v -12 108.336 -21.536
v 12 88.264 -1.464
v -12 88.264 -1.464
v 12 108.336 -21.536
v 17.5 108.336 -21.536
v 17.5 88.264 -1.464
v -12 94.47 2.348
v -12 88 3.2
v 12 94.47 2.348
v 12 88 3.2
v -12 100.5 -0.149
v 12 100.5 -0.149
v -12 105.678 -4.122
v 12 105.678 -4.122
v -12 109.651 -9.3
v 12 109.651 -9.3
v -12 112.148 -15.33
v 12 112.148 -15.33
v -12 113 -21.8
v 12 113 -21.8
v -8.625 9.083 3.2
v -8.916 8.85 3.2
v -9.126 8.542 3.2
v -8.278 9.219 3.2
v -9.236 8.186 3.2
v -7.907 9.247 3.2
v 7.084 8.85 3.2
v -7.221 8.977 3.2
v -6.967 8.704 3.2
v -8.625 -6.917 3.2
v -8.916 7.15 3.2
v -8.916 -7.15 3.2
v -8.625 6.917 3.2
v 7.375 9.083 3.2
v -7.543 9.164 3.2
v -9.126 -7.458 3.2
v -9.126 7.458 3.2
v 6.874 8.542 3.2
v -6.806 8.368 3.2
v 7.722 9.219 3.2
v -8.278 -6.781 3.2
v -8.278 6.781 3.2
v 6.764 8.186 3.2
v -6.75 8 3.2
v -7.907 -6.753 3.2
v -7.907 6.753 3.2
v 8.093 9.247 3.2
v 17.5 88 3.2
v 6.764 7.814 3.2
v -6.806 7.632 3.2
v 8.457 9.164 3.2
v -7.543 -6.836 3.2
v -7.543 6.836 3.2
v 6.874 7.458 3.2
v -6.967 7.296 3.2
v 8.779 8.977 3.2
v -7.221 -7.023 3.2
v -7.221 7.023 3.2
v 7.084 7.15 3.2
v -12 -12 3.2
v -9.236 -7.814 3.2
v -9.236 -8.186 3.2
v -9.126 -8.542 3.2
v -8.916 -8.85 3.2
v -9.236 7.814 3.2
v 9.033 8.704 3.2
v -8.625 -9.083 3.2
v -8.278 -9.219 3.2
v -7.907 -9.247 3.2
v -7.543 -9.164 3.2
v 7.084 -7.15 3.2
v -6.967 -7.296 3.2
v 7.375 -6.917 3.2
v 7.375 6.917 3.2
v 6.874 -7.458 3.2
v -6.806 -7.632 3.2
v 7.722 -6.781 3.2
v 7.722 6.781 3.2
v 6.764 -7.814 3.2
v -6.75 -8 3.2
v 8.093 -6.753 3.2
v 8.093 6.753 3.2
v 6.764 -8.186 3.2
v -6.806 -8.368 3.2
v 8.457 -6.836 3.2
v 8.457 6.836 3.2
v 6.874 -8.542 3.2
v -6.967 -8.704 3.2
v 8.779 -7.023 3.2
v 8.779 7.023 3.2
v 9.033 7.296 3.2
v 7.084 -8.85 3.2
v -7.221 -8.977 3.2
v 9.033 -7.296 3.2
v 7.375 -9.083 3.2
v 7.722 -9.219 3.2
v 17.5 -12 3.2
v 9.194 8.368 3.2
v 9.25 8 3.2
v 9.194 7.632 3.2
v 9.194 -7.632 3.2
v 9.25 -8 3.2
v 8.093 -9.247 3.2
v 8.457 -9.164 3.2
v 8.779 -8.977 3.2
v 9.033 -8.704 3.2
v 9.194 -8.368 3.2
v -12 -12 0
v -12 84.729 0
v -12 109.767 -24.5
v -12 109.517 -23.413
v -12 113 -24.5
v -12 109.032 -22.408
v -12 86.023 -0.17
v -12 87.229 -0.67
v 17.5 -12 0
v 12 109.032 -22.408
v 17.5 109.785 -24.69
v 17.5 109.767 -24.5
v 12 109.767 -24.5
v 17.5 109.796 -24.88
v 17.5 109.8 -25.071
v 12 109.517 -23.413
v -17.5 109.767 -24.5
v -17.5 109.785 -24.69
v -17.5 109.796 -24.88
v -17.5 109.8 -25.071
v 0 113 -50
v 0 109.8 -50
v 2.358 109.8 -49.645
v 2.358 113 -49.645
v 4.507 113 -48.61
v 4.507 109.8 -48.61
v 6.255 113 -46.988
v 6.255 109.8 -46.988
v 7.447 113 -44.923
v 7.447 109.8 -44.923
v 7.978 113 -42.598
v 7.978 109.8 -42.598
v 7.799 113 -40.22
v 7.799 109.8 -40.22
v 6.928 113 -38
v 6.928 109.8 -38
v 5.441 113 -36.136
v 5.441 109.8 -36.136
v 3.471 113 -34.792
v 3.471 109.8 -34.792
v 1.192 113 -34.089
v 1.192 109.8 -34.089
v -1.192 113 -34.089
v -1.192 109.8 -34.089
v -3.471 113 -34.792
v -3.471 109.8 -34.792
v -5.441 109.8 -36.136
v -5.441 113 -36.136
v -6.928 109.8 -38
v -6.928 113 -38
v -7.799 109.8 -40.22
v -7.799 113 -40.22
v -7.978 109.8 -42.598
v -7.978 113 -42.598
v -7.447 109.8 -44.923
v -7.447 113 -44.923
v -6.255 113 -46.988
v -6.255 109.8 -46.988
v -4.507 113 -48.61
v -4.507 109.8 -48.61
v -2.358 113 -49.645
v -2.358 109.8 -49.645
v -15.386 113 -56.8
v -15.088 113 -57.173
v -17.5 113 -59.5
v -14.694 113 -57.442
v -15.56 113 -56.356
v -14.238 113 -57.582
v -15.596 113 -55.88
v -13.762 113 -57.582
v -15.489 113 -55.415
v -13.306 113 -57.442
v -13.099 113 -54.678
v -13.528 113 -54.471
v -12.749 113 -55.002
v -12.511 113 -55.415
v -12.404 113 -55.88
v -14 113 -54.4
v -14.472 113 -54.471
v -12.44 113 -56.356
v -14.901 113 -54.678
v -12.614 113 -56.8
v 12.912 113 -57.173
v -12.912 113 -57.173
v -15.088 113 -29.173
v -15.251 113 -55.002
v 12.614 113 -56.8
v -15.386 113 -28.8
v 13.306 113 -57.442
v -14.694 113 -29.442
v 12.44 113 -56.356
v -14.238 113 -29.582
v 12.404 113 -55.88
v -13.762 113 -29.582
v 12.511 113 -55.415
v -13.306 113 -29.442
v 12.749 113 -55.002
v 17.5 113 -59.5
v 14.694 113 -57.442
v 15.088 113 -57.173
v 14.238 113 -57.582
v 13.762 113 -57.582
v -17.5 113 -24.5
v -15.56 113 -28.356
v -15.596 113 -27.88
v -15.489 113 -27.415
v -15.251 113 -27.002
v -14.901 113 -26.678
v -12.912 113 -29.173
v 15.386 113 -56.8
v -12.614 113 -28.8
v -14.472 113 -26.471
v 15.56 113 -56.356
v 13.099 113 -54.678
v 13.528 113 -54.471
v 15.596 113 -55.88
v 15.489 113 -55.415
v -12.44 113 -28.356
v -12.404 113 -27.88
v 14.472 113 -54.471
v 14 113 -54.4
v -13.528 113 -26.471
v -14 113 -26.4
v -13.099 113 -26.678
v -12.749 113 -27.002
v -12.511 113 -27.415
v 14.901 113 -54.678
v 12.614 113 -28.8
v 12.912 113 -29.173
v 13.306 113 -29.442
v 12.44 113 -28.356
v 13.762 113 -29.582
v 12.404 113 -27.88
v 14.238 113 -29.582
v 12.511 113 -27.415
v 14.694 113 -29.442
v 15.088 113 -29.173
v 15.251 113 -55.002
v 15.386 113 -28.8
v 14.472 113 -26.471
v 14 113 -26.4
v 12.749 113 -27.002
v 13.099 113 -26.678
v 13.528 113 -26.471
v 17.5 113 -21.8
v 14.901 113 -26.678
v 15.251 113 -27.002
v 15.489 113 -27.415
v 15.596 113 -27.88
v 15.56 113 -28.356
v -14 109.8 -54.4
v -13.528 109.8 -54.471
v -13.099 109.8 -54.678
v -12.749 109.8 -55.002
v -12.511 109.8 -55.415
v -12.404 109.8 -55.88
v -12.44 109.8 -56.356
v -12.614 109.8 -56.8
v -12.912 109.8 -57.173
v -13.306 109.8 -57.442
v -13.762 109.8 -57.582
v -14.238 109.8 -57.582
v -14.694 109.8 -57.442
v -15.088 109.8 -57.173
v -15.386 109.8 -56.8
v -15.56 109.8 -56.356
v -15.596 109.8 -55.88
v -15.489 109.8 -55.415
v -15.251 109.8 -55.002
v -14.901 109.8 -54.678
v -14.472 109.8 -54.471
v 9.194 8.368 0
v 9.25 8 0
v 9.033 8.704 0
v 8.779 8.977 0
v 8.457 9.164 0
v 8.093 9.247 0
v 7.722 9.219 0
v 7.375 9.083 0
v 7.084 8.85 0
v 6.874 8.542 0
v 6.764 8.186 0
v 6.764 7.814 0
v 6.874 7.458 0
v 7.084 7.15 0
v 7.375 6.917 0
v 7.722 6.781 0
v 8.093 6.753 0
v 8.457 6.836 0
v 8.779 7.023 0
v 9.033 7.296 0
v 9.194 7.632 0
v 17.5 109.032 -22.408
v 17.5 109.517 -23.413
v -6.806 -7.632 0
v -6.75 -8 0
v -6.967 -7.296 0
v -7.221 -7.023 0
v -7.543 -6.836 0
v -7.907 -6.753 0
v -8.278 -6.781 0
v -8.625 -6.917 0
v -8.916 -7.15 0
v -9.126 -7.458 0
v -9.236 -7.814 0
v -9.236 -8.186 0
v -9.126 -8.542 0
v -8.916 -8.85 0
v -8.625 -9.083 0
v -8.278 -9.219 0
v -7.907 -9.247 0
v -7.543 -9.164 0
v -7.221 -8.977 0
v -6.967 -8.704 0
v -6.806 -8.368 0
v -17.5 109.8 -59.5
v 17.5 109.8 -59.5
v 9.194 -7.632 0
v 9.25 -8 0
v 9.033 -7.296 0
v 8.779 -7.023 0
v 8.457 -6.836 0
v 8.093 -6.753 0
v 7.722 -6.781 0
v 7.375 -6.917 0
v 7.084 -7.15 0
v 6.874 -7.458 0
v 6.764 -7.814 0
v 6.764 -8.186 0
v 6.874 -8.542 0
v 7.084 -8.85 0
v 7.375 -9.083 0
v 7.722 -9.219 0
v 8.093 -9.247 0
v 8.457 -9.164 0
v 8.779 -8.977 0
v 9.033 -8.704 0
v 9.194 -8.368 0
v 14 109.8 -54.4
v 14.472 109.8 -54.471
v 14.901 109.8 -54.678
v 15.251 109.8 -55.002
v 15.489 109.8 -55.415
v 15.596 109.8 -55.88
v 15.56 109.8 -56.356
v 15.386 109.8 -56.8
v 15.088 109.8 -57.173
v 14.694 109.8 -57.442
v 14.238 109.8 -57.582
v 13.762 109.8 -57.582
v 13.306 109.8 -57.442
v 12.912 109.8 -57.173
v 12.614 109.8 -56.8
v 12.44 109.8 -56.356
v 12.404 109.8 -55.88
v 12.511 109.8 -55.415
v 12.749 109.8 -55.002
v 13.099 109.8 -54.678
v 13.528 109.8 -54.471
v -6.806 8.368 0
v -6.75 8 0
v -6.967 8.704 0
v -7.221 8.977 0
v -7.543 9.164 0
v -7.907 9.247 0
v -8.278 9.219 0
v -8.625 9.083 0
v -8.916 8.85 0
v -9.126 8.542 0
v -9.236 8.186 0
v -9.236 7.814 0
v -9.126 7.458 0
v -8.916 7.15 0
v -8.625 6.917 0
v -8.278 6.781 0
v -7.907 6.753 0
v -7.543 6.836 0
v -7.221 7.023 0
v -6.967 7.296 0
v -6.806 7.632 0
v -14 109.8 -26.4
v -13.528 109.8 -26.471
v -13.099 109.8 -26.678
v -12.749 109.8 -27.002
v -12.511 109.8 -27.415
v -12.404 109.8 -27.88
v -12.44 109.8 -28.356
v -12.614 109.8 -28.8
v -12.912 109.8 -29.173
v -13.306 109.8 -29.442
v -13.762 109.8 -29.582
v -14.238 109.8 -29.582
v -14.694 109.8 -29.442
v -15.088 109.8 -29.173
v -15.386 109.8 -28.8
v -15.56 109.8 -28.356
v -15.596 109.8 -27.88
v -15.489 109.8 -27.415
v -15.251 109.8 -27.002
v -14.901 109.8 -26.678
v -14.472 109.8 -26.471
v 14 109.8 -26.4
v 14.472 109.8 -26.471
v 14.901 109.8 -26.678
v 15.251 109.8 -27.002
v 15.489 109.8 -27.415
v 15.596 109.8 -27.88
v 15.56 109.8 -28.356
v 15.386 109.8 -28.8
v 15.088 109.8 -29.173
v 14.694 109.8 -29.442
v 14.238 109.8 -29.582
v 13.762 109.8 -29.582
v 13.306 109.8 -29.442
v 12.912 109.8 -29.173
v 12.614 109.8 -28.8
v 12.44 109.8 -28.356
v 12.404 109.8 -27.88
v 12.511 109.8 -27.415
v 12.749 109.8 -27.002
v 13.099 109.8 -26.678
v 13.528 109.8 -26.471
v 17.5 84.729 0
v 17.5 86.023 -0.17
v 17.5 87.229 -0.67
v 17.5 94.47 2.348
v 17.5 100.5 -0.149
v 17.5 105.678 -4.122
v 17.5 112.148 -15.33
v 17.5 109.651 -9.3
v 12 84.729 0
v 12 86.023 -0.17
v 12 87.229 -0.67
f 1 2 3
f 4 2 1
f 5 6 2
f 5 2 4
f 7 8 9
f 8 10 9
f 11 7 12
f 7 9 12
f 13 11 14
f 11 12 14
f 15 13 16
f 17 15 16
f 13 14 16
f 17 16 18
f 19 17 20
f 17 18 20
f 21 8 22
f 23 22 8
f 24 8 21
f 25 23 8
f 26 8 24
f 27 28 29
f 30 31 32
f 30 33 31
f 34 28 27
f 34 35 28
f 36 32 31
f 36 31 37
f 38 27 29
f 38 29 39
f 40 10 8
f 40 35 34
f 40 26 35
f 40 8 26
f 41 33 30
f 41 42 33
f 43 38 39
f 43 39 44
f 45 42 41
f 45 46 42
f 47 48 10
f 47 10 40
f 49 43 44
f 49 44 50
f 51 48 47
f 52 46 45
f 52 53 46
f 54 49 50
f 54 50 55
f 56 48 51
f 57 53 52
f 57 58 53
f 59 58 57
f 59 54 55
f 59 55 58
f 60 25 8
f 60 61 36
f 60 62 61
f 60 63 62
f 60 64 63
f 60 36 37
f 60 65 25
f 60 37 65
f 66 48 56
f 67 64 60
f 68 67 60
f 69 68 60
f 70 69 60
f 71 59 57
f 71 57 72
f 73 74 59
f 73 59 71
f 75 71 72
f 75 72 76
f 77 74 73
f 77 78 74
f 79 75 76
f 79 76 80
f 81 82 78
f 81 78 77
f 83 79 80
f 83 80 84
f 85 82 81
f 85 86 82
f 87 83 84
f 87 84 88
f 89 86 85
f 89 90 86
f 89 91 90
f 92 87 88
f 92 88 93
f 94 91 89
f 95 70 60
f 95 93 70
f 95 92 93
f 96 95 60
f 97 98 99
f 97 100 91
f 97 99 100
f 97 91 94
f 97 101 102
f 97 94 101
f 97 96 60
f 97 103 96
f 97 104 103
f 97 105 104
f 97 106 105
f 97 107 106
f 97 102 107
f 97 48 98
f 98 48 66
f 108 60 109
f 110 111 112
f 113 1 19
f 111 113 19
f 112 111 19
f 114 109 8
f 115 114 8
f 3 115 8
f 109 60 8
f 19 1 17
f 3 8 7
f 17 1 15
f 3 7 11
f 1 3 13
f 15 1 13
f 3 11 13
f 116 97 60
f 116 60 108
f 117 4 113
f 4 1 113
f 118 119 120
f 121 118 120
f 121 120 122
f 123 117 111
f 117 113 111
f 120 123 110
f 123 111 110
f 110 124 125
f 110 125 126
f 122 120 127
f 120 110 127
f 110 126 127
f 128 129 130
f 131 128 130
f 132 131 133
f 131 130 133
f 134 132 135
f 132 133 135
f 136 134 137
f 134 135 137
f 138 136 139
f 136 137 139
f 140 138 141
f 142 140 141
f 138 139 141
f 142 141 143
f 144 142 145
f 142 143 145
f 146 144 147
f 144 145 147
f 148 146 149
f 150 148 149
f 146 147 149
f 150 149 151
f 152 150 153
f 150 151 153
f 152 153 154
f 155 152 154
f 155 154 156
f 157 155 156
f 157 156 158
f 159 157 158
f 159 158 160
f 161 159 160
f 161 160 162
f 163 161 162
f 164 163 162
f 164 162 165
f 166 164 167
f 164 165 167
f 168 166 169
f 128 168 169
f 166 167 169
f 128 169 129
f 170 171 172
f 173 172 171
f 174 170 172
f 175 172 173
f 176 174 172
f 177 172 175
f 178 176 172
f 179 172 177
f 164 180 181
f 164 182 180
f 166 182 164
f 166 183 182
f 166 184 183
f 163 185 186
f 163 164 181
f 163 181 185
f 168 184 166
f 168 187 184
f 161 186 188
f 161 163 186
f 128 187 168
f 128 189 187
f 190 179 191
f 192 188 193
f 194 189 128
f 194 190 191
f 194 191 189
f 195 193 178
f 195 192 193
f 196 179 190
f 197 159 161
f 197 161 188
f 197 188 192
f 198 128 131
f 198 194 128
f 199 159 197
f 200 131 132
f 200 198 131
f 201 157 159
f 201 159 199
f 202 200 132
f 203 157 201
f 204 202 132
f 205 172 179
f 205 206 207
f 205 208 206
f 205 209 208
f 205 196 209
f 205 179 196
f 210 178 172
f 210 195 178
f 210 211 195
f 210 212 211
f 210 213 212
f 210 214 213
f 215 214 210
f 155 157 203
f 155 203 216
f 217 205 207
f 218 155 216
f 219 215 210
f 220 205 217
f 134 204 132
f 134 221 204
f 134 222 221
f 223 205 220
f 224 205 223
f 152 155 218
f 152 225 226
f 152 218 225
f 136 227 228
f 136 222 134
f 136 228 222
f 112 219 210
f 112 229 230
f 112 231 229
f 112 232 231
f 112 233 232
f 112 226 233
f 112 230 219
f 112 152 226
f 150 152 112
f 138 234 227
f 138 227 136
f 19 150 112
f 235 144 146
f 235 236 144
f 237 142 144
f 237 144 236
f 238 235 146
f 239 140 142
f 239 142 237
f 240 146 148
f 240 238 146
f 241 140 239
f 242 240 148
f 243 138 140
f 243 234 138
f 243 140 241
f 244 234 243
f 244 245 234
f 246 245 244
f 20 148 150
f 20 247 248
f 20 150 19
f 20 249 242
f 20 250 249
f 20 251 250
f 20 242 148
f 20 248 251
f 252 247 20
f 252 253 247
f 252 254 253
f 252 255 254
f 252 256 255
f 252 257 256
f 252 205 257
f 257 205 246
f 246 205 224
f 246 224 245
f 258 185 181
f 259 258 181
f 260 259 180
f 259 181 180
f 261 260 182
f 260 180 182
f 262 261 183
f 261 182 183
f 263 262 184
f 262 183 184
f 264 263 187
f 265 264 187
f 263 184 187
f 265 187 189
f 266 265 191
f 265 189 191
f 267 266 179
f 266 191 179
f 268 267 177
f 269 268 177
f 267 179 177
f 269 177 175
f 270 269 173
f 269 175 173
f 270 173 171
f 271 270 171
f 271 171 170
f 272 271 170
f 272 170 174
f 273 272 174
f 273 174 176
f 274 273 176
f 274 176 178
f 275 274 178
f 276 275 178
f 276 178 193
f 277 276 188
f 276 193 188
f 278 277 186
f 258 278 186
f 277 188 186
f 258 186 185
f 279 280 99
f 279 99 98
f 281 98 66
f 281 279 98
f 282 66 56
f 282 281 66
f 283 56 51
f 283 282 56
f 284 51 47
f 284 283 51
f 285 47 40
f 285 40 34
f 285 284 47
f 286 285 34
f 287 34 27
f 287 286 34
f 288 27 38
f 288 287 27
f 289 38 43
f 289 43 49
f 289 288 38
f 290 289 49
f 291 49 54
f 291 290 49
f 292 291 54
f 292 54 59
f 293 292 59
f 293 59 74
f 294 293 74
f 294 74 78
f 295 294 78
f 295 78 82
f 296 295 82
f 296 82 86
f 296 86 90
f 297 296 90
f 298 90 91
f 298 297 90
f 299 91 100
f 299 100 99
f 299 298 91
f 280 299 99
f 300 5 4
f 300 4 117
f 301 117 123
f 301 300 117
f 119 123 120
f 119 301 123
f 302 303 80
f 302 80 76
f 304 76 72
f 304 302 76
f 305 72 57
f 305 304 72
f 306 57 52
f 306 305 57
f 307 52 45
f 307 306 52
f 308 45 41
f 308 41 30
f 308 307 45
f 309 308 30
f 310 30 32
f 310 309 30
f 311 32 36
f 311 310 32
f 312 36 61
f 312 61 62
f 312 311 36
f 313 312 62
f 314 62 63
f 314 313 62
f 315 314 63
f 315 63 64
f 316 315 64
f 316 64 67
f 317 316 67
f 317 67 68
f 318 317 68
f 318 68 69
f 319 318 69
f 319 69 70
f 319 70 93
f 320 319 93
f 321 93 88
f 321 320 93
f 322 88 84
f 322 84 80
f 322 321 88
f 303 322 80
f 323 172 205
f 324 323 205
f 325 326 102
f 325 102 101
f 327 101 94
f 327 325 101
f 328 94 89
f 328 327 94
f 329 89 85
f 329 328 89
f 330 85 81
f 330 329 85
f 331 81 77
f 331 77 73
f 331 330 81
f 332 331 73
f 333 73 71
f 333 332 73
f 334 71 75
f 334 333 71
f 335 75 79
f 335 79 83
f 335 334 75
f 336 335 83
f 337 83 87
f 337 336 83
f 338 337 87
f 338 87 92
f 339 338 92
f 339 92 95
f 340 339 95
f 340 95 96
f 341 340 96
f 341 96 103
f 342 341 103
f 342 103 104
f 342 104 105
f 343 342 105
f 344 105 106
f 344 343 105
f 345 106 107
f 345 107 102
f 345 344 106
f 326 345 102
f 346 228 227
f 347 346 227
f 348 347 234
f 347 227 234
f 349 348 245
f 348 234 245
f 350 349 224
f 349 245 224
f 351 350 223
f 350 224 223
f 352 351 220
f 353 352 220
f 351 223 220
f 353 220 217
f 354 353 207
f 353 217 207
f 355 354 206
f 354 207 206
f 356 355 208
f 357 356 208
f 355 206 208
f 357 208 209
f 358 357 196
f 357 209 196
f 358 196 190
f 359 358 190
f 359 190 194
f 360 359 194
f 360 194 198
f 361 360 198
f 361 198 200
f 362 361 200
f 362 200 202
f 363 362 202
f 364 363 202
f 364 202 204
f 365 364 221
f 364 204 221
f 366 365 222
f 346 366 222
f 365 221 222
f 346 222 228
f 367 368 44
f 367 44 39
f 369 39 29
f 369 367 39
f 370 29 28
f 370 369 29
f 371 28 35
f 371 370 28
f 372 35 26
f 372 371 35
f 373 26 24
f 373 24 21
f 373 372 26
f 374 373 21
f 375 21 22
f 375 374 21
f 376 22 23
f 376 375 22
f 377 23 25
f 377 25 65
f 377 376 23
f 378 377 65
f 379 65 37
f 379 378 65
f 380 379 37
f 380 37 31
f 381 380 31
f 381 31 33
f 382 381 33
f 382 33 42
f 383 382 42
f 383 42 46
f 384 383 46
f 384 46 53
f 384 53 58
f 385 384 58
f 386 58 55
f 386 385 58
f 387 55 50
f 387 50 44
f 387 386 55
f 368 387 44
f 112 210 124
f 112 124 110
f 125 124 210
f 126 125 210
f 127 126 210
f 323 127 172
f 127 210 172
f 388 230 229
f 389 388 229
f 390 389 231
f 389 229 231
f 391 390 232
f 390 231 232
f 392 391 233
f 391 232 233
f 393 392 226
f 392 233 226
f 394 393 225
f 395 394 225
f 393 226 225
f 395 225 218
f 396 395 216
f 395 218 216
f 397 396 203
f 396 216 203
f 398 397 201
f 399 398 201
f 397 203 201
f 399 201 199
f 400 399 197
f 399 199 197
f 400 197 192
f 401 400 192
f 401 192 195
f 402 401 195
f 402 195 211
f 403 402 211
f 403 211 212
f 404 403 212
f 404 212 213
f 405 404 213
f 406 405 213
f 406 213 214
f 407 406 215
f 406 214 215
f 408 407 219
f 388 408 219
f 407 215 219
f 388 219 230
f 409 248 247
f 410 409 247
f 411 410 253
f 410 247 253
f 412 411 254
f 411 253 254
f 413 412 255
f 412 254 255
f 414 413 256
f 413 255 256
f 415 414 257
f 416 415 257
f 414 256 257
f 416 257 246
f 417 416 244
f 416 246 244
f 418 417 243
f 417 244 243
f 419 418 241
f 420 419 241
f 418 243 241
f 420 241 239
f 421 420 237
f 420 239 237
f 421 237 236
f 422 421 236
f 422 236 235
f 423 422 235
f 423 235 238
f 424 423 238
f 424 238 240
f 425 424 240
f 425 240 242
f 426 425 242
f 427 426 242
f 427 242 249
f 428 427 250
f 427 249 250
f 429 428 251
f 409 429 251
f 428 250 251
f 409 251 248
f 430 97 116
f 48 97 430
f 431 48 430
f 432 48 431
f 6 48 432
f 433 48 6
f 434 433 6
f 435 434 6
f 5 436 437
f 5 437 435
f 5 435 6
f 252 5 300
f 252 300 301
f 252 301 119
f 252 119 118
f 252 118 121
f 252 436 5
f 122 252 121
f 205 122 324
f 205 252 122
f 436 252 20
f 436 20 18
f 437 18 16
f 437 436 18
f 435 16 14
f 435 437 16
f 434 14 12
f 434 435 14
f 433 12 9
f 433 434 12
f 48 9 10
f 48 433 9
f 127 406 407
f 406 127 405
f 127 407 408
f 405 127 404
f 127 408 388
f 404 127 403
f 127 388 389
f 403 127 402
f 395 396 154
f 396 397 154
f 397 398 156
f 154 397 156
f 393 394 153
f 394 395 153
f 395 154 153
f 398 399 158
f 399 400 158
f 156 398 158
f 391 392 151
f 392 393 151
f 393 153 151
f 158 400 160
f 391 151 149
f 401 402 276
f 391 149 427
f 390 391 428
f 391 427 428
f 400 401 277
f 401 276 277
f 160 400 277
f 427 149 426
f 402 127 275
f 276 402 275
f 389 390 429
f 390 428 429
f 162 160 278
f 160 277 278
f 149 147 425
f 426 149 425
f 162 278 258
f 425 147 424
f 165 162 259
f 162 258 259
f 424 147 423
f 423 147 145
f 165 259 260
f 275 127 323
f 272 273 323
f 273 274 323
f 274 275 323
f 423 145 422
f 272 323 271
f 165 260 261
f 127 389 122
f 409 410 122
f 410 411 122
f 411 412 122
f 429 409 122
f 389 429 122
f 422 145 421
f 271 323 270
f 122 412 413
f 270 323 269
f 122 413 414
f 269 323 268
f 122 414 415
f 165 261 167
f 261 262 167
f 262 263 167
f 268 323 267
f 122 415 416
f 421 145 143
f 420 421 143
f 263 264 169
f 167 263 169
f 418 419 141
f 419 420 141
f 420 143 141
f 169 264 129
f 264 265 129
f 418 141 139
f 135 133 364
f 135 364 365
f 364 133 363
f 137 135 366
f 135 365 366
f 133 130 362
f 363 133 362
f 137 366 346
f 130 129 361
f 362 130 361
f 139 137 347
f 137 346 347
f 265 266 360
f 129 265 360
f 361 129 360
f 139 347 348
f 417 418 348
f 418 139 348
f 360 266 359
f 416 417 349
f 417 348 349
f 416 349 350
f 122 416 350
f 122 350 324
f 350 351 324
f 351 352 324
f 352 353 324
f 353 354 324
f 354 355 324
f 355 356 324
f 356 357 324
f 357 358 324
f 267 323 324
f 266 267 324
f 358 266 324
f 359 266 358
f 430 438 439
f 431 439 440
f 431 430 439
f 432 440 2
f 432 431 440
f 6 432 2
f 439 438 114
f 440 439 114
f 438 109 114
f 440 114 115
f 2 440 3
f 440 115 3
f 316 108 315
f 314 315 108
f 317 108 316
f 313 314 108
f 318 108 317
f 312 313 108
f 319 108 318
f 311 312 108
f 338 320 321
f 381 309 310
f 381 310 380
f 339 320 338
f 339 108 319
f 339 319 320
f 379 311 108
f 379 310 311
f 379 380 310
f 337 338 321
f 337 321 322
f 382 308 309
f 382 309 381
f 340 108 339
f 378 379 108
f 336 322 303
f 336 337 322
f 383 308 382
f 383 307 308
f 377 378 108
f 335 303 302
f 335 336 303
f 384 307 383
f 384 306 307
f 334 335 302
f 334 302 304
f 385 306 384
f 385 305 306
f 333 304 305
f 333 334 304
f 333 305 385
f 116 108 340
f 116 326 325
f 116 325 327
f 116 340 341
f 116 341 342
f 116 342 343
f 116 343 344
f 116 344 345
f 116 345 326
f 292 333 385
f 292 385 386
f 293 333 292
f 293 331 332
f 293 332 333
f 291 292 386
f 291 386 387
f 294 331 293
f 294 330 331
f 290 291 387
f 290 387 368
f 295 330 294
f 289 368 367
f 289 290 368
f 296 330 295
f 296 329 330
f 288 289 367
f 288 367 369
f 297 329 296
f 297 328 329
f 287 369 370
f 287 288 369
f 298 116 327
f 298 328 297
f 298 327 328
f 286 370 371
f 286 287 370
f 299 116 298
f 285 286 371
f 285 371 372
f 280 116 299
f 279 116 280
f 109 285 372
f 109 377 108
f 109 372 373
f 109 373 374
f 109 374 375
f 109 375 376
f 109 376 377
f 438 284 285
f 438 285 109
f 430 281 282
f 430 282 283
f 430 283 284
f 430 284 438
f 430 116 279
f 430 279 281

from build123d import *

# Parameters (mm, degrees)
SKETCH1_W           = 24
SKETCH1_H           = 125
SKETCH1_R           = 1.25
BOSS_EXTRUDE1_DEPTH = 3.2
SKETCH2_W           = 24
SKETCH2_H           = 3.2
BOSS_EXTRUDE2_DEPTH = 42
SKETCH3_W           = 35
SKETCH3_H           = 35
SKETCH3_R           = 1.6
BOSS_EXTRUDE3_DEPTH = 3.2
SKETCH4_R           = 8
CUT_EXTRUDE1_DEPTH  = 3.2
CHAMFER1_SIZE       = 23
FILLET1_R           = 25
FILLET2_R           = 5
BOSS_EXTRUDE4_START = 5.5
BOSS_EXTRUDE4_DEPTH = 5.5


with BuildPart() as part:
    # Sketch1 → Boss-Extrude1 (new body)
    with BuildSketch(Plane.XY):
        with Locations((0, 50.5)):
            Rectangle(SKETCH1_W, SKETCH1_H)
        with Locations((-8, 8)):
            Circle(SKETCH1_R, mode=Mode.SUBTRACT)
        with Locations((8, 8)):
            Circle(SKETCH1_R, mode=Mode.SUBTRACT)
        with Locations((8, -8)):
            Circle(SKETCH1_R, mode=Mode.SUBTRACT)
        with Locations((-8, -8)):
            Circle(SKETCH1_R, mode=Mode.SUBTRACT)
    extrude(amount=BOSS_EXTRUDE1_DEPTH)

    # Sketch2 → Boss-Extrude2 (add)
    with BuildSketch(Plane(origin=(0, 0, 0), x_dir=(-1, 0, 0), z_dir=(0, 0, -1))):
        with Locations((0, 111.4)):
            Rectangle(SKETCH2_W, SKETCH2_H)
    extrude(amount=BOSS_EXTRUDE2_DEPTH)

    # Sketch3 → Boss-Extrude3 (add)
    with BuildSketch(Plane(origin=(0, 113, 0), x_dir=(1, 0, 0), z_dir=(0, 1, 0))):
        with Locations((0, 42)):
            Rectangle(SKETCH3_W, SKETCH3_H)
        with Locations(Location((14, 28, 0), (0, 0, 270))):
            Circle(SKETCH3_R, mode=Mode.SUBTRACT)
        with Locations(Location((14, 56, 0), (0, 0, 270))):
            Circle(SKETCH3_R, mode=Mode.SUBTRACT)
        with Locations(Location((-14, 56, 0), (0, 0, 270))):
            Circle(SKETCH3_R, mode=Mode.SUBTRACT)
        with Locations(Location((-14, 28, 0), (0, 0, 270))):
            Circle(SKETCH3_R, mode=Mode.SUBTRACT)
    extrude(amount=-BOSS_EXTRUDE3_DEPTH)

    # Sketch4 → Cut-Extrude1 (cut)
    with BuildSketch(Plane.XZ.offset(-109.8)):
        with Locations(Location((0, -42, 0), (0, 0, 270))):
            Circle(SKETCH4_R)
    extrude(amount=-CUT_EXTRUDE1_DEPTH, mode=Mode.SUBTRACT)

    # Chamfer1
    chamfer1_edges = [part.edges().sort_by_distance(p)[0] for p in [
        (0, 109.8, 0),
    ]]
    chamfer(chamfer1_edges, length=CHAMFER1_SIZE)

    # Fillet1
    fillet1_edges = [part.edges().sort_by_distance(p)[0] for p in [
        (0, 113, 3.2),
    ]]
    fillet(fillet1_edges, radius=FILLET1_R)

    # Fillet2
    fillet2_edges = [part.edges().sort_by_distance(p)[0] for p in [
        (0, 109.8, -23),
        (0, 86.8, 0),
    ]]
    fillet(fillet2_edges, radius=FILLET2_R)

    # Sketch7 → Boss-Extrude4 (add)
    with BuildSketch(Plane(origin=(12, 0, 0), x_dir=(0, 0, -1), z_dir=(1, 0, 0)).offset(BOSS_EXTRUDE4_START)):
        with BuildLine():
            Line((24.5, 113), (21.8, 113))
            ThreePointArc((21.8, 113), (4.12233047, 105.67766953), (-3.2, 88))
            Line((-3.2, 88), (-3.2, -12))
            Line((-3.2, -12), (0, -12))
            Line((0, -12), (0, 84.728932188))
            ThreePointArc((0, 84.728932188), (0.380602337, 86.64234935), (1.464466094, 88.264466094))
            Line((1.464466094, 88.264466094), (21.535533906, 108.335533906))
            ThreePointArc((21.535533906, 108.335533906), (22.896551906, 109.302386098), (24.5, 109.767281103))
            Line((24.5, 109.767281103), (24.5, 113))
        make_face()
    extrude(amount=-BOSS_EXTRUDE4_DEPTH)


solid = part.part
